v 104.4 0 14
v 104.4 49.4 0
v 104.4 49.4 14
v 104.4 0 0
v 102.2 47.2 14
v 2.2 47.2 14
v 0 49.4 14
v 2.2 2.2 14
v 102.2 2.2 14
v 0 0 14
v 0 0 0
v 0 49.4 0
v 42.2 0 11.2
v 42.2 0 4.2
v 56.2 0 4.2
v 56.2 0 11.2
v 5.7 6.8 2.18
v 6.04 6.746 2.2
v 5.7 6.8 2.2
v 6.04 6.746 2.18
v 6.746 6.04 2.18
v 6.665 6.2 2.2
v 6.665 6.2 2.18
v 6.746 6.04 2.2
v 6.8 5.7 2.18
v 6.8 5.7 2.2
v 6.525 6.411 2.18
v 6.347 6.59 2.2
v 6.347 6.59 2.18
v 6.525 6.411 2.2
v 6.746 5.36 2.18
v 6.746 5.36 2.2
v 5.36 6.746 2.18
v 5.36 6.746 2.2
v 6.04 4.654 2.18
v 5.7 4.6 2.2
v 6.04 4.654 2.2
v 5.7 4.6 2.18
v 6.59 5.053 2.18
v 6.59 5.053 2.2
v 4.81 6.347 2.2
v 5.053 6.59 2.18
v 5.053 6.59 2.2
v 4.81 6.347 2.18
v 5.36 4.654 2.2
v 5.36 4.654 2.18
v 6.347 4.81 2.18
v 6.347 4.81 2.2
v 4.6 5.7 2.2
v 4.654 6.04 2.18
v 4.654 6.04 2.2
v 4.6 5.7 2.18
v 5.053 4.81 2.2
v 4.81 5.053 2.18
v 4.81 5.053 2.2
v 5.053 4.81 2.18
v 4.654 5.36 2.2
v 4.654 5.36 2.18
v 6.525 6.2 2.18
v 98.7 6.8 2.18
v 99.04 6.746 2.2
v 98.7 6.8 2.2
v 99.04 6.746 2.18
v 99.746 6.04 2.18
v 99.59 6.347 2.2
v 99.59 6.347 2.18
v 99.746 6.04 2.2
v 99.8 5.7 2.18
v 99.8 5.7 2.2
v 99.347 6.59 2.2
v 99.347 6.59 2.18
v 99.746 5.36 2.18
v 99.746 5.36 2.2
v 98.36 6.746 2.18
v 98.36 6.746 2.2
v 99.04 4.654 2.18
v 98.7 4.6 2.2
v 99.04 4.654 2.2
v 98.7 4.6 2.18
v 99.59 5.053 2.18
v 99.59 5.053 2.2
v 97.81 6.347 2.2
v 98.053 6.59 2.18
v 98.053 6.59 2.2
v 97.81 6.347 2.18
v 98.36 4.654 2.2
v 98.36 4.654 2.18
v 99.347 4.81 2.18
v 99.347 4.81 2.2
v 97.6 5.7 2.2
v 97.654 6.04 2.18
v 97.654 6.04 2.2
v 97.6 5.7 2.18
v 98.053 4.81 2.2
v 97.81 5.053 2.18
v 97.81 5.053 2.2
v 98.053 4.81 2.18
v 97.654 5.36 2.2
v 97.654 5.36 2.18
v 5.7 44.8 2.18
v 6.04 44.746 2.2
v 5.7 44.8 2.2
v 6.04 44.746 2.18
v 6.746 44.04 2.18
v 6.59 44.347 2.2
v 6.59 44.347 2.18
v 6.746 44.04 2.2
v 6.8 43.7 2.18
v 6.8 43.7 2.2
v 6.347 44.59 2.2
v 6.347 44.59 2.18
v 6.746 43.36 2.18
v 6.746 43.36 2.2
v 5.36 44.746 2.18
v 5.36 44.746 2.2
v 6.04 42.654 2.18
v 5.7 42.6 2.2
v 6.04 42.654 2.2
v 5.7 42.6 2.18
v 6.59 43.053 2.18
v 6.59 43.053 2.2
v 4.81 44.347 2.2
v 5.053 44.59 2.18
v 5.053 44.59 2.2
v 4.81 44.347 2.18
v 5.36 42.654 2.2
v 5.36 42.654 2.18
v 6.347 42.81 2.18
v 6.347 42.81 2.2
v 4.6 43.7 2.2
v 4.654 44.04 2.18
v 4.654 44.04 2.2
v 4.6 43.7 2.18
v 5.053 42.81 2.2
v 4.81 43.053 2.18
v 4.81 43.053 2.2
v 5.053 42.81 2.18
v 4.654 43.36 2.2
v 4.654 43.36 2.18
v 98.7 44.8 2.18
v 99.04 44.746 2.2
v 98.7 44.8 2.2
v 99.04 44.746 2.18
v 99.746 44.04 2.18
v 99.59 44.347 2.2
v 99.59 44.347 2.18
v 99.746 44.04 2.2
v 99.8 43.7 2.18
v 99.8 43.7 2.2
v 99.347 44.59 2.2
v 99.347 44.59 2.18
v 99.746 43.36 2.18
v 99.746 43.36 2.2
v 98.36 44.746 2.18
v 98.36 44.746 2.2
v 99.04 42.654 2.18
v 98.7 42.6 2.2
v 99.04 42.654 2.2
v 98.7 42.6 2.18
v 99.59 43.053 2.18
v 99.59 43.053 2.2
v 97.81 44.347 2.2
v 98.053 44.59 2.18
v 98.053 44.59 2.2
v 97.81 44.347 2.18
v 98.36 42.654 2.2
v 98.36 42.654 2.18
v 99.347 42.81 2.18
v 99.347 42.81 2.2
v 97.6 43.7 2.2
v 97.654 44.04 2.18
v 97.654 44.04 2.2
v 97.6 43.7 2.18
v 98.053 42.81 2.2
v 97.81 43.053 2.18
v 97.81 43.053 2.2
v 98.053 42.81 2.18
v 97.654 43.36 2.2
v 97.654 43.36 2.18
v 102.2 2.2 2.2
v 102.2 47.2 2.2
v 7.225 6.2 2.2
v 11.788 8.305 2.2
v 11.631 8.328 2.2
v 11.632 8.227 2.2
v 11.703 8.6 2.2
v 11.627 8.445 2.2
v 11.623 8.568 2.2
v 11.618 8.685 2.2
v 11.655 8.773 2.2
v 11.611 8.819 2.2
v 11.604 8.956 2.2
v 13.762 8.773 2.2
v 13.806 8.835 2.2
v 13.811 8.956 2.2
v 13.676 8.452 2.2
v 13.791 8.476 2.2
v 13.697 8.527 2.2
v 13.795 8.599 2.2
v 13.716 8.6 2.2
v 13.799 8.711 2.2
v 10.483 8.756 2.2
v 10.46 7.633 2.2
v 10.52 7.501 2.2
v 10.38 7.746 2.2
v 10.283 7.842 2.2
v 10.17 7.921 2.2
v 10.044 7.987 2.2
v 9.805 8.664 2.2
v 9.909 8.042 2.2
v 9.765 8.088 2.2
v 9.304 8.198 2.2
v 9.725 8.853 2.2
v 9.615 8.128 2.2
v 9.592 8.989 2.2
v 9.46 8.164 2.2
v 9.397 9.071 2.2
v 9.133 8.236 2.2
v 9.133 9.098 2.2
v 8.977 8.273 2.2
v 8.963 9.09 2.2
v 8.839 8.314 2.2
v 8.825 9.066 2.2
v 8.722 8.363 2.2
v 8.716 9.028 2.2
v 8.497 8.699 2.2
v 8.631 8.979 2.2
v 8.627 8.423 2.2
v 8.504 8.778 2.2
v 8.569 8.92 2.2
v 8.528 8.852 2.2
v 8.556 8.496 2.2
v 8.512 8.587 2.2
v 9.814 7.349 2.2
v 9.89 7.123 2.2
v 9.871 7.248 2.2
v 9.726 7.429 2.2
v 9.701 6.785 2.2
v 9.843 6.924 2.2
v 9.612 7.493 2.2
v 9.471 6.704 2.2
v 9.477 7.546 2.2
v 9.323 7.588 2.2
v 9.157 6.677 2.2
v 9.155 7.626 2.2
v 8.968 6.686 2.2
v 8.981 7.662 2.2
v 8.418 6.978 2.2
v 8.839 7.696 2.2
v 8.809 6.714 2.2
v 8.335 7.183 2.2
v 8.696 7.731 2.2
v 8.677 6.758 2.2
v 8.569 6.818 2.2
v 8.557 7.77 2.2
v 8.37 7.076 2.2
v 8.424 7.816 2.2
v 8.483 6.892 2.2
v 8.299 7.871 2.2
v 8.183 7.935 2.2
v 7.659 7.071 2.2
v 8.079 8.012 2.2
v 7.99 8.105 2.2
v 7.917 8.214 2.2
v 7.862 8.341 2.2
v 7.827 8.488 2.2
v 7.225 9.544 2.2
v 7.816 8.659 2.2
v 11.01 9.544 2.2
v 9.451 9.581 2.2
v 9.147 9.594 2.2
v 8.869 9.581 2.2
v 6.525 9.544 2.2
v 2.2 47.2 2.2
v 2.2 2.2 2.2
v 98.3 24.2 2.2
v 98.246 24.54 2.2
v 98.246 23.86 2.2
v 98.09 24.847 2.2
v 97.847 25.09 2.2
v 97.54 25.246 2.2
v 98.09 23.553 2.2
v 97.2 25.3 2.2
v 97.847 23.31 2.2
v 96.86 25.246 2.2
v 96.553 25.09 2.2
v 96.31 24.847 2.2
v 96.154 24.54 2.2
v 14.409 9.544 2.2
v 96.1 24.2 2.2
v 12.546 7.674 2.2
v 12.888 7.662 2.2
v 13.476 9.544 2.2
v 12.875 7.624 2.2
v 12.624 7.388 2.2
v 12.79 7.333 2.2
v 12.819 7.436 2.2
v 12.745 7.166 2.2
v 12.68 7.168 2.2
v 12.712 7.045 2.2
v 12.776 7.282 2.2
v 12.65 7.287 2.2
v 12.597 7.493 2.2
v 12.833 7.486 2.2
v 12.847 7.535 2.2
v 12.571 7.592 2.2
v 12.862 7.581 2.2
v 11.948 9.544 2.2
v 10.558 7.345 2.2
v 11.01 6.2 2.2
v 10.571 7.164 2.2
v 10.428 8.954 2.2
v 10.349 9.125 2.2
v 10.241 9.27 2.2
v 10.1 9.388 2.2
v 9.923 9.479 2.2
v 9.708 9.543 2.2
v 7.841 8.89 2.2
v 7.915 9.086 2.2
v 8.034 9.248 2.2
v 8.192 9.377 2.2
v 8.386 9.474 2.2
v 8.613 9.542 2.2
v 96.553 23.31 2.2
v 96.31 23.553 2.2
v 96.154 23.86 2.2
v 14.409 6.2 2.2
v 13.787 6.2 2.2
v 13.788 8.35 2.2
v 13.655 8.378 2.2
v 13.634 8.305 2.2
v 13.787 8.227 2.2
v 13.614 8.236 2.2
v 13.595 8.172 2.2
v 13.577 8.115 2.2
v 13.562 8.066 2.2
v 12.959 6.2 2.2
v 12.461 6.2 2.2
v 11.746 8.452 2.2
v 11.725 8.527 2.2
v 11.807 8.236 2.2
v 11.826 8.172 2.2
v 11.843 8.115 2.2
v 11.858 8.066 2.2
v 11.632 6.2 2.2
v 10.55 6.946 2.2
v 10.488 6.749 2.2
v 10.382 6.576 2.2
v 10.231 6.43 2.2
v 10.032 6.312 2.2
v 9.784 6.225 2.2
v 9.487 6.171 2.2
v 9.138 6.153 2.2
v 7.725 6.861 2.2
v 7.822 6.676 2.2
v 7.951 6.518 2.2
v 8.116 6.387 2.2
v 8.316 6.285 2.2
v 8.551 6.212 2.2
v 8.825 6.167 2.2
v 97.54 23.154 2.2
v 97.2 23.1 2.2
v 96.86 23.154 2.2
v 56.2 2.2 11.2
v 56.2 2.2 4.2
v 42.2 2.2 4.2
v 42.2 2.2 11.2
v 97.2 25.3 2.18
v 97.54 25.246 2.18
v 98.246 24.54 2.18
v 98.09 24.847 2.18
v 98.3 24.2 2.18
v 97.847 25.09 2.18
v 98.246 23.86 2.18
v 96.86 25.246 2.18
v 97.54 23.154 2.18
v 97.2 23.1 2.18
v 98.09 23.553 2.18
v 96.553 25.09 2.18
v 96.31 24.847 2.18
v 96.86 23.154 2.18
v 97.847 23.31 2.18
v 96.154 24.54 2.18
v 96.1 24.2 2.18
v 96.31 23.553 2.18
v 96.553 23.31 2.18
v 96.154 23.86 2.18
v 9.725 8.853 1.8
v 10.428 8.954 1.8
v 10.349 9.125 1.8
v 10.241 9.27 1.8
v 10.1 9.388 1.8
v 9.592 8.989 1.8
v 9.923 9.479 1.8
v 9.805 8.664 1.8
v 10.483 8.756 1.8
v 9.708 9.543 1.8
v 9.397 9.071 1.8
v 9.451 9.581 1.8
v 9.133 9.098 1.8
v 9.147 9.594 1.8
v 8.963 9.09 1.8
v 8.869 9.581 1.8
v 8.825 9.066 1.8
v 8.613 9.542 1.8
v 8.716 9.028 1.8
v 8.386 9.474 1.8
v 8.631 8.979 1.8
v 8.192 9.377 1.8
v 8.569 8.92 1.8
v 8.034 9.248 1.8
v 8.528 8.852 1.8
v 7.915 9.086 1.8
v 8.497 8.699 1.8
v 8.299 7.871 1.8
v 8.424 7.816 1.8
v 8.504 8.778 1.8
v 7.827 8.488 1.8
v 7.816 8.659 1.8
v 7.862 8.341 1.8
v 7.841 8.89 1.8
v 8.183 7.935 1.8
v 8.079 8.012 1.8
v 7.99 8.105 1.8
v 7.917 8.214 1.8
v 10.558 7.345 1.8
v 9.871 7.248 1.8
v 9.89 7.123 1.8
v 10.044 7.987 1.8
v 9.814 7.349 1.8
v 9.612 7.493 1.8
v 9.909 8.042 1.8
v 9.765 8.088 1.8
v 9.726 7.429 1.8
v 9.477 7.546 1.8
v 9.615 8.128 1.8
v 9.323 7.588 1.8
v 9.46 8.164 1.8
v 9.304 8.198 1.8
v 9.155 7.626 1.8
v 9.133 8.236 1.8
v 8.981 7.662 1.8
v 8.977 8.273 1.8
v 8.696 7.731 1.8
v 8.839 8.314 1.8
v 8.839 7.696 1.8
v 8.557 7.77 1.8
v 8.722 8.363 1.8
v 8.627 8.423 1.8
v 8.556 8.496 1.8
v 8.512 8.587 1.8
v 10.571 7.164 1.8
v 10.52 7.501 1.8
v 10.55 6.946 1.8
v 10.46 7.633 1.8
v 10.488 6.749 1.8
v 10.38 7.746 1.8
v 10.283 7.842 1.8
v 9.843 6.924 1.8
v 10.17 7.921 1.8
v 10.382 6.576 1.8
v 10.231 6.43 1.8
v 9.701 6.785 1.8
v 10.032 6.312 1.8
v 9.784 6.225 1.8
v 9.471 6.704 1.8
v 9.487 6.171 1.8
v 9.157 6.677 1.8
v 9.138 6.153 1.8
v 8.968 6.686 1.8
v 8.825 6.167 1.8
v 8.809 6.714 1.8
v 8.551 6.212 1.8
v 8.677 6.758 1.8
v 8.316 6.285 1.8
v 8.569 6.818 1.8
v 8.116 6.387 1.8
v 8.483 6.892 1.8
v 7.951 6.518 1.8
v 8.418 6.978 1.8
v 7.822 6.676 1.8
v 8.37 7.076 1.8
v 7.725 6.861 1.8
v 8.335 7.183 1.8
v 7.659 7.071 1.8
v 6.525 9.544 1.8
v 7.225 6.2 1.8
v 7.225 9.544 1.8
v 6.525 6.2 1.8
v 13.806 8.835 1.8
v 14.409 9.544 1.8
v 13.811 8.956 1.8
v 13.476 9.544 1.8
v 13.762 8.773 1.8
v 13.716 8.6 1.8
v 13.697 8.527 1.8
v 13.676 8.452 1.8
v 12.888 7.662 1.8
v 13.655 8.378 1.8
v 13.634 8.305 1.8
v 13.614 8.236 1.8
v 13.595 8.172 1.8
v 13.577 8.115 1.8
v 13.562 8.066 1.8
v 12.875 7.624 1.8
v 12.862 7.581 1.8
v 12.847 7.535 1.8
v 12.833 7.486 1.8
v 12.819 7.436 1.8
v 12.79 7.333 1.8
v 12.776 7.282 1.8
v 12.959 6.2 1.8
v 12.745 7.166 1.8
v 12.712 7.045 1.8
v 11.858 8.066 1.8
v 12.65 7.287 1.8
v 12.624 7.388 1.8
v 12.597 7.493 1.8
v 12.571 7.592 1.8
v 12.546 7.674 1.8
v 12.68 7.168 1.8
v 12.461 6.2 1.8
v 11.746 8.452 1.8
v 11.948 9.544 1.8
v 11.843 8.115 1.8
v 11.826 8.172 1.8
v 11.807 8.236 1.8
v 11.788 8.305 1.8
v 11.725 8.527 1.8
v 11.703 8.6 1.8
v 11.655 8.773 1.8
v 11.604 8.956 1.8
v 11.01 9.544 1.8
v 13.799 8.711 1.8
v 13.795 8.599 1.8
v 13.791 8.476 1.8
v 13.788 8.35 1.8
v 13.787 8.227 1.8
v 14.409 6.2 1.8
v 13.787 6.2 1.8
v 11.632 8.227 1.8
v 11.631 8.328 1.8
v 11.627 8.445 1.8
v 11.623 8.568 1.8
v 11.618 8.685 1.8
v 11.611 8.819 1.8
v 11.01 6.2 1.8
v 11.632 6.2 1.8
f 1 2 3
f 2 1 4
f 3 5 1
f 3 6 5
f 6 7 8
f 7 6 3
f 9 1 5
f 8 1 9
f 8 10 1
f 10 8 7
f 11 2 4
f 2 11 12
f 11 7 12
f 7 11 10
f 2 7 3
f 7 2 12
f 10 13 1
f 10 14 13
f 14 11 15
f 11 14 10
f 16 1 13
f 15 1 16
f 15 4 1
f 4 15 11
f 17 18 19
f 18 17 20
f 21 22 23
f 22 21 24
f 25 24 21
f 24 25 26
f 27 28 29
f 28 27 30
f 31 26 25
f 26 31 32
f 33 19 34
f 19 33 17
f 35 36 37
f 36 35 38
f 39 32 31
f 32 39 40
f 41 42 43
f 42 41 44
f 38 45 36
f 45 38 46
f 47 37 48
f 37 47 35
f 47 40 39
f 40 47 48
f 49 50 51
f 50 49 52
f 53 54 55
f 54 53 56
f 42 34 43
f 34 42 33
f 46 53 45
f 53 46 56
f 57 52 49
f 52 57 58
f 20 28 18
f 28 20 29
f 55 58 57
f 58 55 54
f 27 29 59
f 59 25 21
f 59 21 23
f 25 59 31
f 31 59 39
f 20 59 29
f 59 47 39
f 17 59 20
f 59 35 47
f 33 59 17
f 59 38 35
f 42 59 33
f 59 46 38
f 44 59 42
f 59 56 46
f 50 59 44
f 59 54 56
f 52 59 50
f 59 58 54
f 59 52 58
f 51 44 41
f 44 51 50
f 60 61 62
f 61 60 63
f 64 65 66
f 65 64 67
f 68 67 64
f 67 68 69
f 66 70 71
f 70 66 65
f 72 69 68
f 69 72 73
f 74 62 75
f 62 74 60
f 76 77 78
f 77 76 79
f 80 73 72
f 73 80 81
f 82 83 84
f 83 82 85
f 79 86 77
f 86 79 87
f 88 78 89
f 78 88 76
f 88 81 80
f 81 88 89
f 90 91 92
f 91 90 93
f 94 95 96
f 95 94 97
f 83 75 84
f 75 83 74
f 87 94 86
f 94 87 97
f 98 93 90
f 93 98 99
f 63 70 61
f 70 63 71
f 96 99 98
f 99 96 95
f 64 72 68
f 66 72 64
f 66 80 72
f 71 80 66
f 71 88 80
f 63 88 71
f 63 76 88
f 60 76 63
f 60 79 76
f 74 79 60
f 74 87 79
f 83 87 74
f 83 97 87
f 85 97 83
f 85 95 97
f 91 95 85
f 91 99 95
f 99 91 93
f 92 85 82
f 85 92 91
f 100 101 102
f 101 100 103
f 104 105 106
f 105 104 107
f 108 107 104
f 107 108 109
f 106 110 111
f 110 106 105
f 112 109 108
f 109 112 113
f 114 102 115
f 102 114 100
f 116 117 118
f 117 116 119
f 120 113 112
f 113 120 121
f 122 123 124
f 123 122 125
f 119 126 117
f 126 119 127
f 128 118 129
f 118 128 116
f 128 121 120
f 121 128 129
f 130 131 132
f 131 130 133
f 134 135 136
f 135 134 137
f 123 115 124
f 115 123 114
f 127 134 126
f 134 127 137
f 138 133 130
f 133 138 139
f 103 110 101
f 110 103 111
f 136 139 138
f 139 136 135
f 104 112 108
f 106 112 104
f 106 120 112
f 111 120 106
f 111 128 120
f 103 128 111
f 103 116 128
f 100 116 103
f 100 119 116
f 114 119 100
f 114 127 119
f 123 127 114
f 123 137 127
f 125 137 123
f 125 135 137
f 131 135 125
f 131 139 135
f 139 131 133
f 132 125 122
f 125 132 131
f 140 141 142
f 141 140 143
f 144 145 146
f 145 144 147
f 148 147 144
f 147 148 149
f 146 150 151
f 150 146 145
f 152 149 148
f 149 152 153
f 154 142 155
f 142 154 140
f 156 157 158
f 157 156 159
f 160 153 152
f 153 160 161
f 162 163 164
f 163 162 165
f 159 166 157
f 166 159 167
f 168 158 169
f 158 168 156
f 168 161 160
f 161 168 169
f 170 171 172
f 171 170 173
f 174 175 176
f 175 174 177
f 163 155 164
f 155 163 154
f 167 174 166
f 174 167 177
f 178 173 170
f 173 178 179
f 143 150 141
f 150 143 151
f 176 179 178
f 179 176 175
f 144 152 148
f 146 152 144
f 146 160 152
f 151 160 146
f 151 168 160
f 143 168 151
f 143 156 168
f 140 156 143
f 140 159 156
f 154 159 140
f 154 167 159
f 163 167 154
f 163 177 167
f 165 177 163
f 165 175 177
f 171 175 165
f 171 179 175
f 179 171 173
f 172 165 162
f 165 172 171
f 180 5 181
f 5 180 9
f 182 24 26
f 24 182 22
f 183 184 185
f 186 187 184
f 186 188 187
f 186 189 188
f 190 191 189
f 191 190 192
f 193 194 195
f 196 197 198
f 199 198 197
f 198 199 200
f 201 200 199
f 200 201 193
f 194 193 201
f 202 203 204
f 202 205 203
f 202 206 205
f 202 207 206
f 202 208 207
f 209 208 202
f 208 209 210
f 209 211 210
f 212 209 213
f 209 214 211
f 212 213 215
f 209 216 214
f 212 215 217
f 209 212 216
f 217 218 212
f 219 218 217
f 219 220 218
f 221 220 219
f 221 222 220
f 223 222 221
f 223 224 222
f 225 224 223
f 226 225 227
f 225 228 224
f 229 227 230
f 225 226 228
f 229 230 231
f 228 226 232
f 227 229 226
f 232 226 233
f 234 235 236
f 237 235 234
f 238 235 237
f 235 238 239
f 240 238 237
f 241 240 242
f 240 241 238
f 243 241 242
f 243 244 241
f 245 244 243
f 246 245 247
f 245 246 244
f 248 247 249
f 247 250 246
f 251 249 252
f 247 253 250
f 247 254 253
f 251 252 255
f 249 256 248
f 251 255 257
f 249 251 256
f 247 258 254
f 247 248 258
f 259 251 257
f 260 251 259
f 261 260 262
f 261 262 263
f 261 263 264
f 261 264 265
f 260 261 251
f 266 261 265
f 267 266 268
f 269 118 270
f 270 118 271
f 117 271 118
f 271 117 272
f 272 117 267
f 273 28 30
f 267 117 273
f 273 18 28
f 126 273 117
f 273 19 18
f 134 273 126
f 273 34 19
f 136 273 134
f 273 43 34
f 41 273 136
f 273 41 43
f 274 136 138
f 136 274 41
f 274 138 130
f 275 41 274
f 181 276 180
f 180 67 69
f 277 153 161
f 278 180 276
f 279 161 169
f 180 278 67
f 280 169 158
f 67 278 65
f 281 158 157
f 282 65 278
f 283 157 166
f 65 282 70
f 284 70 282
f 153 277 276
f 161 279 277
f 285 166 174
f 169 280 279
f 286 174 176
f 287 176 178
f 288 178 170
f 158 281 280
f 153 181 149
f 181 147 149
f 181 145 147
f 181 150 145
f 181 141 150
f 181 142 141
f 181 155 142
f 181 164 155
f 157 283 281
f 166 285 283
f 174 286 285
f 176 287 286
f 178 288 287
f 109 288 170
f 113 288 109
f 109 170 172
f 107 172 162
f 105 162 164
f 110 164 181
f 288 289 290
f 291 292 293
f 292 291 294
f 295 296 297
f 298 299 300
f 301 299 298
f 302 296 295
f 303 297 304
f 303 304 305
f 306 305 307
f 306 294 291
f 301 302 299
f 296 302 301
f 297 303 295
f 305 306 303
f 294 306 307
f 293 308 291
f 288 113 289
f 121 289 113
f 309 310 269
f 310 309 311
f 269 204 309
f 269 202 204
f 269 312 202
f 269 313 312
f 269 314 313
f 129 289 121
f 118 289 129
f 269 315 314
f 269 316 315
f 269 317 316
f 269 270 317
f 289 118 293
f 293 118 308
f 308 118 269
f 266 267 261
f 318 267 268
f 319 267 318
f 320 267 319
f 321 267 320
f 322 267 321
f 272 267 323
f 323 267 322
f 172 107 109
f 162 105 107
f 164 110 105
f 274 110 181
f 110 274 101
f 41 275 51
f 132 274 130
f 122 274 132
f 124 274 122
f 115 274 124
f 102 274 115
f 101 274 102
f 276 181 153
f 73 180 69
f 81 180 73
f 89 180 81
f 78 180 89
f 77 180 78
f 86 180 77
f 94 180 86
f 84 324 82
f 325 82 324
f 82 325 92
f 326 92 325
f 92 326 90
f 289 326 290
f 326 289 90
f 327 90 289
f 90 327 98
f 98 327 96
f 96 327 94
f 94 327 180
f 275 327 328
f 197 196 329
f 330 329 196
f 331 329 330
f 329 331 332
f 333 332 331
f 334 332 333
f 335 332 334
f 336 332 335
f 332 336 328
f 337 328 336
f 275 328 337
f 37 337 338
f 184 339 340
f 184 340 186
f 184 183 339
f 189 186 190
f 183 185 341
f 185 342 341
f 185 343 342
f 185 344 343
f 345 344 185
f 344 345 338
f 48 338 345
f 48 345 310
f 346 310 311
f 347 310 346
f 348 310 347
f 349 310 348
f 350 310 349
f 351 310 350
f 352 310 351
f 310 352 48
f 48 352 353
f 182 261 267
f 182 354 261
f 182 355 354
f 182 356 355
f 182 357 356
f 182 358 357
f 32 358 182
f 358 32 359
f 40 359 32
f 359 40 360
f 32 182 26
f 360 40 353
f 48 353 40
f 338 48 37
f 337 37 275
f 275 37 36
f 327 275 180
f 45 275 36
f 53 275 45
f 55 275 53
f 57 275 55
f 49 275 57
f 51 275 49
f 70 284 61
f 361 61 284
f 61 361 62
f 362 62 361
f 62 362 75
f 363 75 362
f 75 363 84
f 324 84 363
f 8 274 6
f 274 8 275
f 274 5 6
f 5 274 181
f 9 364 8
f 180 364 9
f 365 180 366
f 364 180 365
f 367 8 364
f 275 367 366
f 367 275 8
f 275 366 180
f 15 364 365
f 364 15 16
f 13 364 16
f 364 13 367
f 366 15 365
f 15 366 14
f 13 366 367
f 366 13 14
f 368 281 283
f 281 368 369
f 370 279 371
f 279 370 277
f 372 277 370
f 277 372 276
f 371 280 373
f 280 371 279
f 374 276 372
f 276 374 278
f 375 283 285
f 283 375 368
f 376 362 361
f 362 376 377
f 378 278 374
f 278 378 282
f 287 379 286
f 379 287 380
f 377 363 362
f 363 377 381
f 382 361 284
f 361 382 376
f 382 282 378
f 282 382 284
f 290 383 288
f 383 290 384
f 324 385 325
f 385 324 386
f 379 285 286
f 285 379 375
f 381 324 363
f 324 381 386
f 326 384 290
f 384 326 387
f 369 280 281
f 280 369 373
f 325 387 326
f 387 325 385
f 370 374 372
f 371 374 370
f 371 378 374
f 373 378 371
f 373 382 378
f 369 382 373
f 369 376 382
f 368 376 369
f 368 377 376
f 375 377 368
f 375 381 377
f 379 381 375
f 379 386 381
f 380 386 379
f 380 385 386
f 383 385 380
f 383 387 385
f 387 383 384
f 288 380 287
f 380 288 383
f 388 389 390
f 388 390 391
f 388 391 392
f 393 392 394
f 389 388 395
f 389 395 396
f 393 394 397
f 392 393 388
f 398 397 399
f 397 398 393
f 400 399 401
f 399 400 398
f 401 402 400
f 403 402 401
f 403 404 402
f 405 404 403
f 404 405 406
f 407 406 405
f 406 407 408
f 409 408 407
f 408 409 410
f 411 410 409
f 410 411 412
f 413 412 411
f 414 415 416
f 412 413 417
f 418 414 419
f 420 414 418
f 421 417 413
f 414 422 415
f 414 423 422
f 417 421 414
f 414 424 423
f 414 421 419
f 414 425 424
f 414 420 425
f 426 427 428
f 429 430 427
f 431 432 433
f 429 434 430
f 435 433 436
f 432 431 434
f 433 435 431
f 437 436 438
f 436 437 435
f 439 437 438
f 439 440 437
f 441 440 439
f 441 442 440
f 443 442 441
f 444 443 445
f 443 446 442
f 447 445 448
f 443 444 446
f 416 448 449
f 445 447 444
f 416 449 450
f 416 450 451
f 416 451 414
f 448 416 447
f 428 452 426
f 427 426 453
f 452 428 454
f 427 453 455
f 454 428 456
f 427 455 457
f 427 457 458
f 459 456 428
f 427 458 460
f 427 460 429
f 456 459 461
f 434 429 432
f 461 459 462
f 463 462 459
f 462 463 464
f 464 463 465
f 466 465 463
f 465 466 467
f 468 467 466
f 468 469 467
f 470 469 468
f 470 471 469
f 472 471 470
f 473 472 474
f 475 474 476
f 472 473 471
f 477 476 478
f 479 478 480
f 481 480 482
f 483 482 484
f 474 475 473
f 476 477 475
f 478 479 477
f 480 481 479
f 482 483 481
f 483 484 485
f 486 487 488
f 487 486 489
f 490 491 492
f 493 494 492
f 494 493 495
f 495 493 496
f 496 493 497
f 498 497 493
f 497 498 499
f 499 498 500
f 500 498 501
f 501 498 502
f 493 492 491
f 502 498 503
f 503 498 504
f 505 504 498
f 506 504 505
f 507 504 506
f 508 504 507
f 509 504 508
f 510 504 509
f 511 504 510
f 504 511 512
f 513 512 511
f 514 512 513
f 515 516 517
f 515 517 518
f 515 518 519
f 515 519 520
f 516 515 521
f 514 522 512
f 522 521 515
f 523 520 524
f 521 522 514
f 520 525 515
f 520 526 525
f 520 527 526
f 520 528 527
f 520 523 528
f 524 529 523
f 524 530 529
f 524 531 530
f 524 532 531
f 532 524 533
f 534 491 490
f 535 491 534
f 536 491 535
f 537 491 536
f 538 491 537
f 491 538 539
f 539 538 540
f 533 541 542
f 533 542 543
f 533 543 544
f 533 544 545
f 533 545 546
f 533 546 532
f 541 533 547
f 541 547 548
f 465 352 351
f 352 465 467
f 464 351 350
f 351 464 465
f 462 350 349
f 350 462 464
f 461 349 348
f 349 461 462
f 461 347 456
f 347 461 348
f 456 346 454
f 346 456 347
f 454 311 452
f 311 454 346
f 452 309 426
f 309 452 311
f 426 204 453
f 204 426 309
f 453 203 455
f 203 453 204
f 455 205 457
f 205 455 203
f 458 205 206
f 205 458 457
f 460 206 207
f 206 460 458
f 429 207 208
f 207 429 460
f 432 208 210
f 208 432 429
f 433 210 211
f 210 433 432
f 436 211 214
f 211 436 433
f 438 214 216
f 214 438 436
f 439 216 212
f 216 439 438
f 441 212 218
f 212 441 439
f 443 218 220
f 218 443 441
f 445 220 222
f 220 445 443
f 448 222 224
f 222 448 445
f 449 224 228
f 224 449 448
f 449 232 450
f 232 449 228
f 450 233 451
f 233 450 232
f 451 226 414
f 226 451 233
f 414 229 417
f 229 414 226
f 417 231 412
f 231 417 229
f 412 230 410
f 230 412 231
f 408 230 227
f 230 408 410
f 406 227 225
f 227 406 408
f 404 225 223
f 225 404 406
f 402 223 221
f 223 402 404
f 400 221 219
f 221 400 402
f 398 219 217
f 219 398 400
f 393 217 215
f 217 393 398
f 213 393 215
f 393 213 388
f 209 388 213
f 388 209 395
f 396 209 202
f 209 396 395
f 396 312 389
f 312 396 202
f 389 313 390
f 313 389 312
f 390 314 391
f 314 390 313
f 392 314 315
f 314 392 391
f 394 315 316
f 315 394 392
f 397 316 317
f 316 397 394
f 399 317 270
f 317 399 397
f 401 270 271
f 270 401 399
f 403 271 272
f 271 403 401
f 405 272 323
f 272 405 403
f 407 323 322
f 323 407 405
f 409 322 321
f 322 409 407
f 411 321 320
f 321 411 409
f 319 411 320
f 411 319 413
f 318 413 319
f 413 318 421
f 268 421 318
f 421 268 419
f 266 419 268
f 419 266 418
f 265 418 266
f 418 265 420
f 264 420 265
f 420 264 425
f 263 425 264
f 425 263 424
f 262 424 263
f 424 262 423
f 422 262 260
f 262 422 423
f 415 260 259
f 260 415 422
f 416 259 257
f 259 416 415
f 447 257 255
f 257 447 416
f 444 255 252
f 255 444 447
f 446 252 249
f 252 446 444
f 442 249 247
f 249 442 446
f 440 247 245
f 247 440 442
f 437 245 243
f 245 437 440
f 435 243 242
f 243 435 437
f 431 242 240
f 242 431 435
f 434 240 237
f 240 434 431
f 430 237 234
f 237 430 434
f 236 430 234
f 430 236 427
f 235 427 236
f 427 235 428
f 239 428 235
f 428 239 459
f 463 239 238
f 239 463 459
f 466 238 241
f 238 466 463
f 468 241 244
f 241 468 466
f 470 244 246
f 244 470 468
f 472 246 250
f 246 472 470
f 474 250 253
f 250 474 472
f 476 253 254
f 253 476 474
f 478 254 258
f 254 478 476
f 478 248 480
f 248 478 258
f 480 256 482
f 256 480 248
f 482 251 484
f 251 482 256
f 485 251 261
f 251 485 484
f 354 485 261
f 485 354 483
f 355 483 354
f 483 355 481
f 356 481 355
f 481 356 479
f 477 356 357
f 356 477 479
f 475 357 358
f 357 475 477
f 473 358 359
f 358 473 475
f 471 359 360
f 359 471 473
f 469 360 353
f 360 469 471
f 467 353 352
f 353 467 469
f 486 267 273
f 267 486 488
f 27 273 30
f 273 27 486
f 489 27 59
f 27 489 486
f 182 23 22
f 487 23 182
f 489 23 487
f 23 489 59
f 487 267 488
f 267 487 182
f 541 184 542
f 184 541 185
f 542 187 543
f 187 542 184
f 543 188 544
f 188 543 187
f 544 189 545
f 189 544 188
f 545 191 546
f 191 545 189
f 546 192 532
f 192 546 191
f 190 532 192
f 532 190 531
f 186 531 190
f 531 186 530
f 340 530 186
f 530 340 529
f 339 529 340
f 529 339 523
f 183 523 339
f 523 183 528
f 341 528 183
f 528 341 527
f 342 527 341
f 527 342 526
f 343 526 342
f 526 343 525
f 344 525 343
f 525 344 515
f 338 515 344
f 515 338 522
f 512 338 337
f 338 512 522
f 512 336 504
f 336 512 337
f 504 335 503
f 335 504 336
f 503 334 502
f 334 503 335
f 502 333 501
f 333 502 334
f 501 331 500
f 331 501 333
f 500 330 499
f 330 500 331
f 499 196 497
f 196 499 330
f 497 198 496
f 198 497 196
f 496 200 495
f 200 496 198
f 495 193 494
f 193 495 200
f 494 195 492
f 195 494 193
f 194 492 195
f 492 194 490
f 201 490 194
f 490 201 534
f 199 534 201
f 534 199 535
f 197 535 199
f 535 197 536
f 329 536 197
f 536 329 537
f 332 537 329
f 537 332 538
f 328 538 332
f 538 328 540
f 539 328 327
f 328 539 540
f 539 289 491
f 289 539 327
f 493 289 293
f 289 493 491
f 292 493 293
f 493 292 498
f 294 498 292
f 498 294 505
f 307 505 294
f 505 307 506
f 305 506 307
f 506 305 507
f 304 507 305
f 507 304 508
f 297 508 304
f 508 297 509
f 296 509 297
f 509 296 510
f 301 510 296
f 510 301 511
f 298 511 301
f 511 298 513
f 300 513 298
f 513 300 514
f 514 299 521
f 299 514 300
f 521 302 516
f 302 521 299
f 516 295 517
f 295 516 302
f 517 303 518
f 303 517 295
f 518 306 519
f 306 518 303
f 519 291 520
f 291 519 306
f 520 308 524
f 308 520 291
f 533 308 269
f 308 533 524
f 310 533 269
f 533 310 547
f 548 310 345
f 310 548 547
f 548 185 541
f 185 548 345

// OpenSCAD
// ISM NVMe M.2 2280 carrier shell (original ISM)
pcb_w = 100;
pcb_d = 45;
wall = 2.2;
box_h = 14;
eps = 0.02;
mount_d = 2.2;
badge_depth = 0.4;

mounts = [[3.5, 3.5], [pcb_w - 3.5, 3.5], [3.5, pcb_d - 3.5], [pcb_w - 3.5, pcb_d - 3.5]];

module carrier() {
  difference() {
    union() {
      cube([pcb_w + 2 * wall, pcb_d + 2 * wall, box_h]);
      for (p = mounts)
        translate([p[0] + wall, p[1] + wall, wall - eps])
          cylinder(h = 4 + eps, d = 5, $fn = 24);
    }
    translate([wall, wall, wall])
      cube([pcb_w, pcb_d, box_h - wall + eps]);
    // USB-C
    translate([wall + 40, -eps, wall + 2])
      cube([14, wall + 4, 7]);
    // M.2 bay access (top)
    translate([wall + 58, wall + 8, box_h - 2])
      cube([38, 28, 4]);
    for (p = mounts)
      translate([p[0] + wall, p[1] + wall, wall - eps])
        cylinder(h = 8 + 2 * eps, d = mount_d, $fn = 20);
    // 2280 retention screw
    translate([wall + 95, wall + 22, wall - eps])
      cylinder(h = 8 + 2 * eps, d = mount_d, $fn = 20);
    translate([wall + 4, wall + 4, wall - badge_depth])
      linear_extrude(height = badge_depth + eps)
        text("ISM", size = 3.5, font = "Liberation Sans:style=Bold");
  }
}

module lid() {
  difference() {
    cube([pcb_w + 2 * wall, pcb_d + 2 * wall, 2.5]);
    translate([4, 4, 2.5 - badge_depth])
      linear_extrude(height = badge_depth + eps)
        text("NVMe", size = 4, font = "Liberation Sans:style=Bold");
  }
}

carrier();
